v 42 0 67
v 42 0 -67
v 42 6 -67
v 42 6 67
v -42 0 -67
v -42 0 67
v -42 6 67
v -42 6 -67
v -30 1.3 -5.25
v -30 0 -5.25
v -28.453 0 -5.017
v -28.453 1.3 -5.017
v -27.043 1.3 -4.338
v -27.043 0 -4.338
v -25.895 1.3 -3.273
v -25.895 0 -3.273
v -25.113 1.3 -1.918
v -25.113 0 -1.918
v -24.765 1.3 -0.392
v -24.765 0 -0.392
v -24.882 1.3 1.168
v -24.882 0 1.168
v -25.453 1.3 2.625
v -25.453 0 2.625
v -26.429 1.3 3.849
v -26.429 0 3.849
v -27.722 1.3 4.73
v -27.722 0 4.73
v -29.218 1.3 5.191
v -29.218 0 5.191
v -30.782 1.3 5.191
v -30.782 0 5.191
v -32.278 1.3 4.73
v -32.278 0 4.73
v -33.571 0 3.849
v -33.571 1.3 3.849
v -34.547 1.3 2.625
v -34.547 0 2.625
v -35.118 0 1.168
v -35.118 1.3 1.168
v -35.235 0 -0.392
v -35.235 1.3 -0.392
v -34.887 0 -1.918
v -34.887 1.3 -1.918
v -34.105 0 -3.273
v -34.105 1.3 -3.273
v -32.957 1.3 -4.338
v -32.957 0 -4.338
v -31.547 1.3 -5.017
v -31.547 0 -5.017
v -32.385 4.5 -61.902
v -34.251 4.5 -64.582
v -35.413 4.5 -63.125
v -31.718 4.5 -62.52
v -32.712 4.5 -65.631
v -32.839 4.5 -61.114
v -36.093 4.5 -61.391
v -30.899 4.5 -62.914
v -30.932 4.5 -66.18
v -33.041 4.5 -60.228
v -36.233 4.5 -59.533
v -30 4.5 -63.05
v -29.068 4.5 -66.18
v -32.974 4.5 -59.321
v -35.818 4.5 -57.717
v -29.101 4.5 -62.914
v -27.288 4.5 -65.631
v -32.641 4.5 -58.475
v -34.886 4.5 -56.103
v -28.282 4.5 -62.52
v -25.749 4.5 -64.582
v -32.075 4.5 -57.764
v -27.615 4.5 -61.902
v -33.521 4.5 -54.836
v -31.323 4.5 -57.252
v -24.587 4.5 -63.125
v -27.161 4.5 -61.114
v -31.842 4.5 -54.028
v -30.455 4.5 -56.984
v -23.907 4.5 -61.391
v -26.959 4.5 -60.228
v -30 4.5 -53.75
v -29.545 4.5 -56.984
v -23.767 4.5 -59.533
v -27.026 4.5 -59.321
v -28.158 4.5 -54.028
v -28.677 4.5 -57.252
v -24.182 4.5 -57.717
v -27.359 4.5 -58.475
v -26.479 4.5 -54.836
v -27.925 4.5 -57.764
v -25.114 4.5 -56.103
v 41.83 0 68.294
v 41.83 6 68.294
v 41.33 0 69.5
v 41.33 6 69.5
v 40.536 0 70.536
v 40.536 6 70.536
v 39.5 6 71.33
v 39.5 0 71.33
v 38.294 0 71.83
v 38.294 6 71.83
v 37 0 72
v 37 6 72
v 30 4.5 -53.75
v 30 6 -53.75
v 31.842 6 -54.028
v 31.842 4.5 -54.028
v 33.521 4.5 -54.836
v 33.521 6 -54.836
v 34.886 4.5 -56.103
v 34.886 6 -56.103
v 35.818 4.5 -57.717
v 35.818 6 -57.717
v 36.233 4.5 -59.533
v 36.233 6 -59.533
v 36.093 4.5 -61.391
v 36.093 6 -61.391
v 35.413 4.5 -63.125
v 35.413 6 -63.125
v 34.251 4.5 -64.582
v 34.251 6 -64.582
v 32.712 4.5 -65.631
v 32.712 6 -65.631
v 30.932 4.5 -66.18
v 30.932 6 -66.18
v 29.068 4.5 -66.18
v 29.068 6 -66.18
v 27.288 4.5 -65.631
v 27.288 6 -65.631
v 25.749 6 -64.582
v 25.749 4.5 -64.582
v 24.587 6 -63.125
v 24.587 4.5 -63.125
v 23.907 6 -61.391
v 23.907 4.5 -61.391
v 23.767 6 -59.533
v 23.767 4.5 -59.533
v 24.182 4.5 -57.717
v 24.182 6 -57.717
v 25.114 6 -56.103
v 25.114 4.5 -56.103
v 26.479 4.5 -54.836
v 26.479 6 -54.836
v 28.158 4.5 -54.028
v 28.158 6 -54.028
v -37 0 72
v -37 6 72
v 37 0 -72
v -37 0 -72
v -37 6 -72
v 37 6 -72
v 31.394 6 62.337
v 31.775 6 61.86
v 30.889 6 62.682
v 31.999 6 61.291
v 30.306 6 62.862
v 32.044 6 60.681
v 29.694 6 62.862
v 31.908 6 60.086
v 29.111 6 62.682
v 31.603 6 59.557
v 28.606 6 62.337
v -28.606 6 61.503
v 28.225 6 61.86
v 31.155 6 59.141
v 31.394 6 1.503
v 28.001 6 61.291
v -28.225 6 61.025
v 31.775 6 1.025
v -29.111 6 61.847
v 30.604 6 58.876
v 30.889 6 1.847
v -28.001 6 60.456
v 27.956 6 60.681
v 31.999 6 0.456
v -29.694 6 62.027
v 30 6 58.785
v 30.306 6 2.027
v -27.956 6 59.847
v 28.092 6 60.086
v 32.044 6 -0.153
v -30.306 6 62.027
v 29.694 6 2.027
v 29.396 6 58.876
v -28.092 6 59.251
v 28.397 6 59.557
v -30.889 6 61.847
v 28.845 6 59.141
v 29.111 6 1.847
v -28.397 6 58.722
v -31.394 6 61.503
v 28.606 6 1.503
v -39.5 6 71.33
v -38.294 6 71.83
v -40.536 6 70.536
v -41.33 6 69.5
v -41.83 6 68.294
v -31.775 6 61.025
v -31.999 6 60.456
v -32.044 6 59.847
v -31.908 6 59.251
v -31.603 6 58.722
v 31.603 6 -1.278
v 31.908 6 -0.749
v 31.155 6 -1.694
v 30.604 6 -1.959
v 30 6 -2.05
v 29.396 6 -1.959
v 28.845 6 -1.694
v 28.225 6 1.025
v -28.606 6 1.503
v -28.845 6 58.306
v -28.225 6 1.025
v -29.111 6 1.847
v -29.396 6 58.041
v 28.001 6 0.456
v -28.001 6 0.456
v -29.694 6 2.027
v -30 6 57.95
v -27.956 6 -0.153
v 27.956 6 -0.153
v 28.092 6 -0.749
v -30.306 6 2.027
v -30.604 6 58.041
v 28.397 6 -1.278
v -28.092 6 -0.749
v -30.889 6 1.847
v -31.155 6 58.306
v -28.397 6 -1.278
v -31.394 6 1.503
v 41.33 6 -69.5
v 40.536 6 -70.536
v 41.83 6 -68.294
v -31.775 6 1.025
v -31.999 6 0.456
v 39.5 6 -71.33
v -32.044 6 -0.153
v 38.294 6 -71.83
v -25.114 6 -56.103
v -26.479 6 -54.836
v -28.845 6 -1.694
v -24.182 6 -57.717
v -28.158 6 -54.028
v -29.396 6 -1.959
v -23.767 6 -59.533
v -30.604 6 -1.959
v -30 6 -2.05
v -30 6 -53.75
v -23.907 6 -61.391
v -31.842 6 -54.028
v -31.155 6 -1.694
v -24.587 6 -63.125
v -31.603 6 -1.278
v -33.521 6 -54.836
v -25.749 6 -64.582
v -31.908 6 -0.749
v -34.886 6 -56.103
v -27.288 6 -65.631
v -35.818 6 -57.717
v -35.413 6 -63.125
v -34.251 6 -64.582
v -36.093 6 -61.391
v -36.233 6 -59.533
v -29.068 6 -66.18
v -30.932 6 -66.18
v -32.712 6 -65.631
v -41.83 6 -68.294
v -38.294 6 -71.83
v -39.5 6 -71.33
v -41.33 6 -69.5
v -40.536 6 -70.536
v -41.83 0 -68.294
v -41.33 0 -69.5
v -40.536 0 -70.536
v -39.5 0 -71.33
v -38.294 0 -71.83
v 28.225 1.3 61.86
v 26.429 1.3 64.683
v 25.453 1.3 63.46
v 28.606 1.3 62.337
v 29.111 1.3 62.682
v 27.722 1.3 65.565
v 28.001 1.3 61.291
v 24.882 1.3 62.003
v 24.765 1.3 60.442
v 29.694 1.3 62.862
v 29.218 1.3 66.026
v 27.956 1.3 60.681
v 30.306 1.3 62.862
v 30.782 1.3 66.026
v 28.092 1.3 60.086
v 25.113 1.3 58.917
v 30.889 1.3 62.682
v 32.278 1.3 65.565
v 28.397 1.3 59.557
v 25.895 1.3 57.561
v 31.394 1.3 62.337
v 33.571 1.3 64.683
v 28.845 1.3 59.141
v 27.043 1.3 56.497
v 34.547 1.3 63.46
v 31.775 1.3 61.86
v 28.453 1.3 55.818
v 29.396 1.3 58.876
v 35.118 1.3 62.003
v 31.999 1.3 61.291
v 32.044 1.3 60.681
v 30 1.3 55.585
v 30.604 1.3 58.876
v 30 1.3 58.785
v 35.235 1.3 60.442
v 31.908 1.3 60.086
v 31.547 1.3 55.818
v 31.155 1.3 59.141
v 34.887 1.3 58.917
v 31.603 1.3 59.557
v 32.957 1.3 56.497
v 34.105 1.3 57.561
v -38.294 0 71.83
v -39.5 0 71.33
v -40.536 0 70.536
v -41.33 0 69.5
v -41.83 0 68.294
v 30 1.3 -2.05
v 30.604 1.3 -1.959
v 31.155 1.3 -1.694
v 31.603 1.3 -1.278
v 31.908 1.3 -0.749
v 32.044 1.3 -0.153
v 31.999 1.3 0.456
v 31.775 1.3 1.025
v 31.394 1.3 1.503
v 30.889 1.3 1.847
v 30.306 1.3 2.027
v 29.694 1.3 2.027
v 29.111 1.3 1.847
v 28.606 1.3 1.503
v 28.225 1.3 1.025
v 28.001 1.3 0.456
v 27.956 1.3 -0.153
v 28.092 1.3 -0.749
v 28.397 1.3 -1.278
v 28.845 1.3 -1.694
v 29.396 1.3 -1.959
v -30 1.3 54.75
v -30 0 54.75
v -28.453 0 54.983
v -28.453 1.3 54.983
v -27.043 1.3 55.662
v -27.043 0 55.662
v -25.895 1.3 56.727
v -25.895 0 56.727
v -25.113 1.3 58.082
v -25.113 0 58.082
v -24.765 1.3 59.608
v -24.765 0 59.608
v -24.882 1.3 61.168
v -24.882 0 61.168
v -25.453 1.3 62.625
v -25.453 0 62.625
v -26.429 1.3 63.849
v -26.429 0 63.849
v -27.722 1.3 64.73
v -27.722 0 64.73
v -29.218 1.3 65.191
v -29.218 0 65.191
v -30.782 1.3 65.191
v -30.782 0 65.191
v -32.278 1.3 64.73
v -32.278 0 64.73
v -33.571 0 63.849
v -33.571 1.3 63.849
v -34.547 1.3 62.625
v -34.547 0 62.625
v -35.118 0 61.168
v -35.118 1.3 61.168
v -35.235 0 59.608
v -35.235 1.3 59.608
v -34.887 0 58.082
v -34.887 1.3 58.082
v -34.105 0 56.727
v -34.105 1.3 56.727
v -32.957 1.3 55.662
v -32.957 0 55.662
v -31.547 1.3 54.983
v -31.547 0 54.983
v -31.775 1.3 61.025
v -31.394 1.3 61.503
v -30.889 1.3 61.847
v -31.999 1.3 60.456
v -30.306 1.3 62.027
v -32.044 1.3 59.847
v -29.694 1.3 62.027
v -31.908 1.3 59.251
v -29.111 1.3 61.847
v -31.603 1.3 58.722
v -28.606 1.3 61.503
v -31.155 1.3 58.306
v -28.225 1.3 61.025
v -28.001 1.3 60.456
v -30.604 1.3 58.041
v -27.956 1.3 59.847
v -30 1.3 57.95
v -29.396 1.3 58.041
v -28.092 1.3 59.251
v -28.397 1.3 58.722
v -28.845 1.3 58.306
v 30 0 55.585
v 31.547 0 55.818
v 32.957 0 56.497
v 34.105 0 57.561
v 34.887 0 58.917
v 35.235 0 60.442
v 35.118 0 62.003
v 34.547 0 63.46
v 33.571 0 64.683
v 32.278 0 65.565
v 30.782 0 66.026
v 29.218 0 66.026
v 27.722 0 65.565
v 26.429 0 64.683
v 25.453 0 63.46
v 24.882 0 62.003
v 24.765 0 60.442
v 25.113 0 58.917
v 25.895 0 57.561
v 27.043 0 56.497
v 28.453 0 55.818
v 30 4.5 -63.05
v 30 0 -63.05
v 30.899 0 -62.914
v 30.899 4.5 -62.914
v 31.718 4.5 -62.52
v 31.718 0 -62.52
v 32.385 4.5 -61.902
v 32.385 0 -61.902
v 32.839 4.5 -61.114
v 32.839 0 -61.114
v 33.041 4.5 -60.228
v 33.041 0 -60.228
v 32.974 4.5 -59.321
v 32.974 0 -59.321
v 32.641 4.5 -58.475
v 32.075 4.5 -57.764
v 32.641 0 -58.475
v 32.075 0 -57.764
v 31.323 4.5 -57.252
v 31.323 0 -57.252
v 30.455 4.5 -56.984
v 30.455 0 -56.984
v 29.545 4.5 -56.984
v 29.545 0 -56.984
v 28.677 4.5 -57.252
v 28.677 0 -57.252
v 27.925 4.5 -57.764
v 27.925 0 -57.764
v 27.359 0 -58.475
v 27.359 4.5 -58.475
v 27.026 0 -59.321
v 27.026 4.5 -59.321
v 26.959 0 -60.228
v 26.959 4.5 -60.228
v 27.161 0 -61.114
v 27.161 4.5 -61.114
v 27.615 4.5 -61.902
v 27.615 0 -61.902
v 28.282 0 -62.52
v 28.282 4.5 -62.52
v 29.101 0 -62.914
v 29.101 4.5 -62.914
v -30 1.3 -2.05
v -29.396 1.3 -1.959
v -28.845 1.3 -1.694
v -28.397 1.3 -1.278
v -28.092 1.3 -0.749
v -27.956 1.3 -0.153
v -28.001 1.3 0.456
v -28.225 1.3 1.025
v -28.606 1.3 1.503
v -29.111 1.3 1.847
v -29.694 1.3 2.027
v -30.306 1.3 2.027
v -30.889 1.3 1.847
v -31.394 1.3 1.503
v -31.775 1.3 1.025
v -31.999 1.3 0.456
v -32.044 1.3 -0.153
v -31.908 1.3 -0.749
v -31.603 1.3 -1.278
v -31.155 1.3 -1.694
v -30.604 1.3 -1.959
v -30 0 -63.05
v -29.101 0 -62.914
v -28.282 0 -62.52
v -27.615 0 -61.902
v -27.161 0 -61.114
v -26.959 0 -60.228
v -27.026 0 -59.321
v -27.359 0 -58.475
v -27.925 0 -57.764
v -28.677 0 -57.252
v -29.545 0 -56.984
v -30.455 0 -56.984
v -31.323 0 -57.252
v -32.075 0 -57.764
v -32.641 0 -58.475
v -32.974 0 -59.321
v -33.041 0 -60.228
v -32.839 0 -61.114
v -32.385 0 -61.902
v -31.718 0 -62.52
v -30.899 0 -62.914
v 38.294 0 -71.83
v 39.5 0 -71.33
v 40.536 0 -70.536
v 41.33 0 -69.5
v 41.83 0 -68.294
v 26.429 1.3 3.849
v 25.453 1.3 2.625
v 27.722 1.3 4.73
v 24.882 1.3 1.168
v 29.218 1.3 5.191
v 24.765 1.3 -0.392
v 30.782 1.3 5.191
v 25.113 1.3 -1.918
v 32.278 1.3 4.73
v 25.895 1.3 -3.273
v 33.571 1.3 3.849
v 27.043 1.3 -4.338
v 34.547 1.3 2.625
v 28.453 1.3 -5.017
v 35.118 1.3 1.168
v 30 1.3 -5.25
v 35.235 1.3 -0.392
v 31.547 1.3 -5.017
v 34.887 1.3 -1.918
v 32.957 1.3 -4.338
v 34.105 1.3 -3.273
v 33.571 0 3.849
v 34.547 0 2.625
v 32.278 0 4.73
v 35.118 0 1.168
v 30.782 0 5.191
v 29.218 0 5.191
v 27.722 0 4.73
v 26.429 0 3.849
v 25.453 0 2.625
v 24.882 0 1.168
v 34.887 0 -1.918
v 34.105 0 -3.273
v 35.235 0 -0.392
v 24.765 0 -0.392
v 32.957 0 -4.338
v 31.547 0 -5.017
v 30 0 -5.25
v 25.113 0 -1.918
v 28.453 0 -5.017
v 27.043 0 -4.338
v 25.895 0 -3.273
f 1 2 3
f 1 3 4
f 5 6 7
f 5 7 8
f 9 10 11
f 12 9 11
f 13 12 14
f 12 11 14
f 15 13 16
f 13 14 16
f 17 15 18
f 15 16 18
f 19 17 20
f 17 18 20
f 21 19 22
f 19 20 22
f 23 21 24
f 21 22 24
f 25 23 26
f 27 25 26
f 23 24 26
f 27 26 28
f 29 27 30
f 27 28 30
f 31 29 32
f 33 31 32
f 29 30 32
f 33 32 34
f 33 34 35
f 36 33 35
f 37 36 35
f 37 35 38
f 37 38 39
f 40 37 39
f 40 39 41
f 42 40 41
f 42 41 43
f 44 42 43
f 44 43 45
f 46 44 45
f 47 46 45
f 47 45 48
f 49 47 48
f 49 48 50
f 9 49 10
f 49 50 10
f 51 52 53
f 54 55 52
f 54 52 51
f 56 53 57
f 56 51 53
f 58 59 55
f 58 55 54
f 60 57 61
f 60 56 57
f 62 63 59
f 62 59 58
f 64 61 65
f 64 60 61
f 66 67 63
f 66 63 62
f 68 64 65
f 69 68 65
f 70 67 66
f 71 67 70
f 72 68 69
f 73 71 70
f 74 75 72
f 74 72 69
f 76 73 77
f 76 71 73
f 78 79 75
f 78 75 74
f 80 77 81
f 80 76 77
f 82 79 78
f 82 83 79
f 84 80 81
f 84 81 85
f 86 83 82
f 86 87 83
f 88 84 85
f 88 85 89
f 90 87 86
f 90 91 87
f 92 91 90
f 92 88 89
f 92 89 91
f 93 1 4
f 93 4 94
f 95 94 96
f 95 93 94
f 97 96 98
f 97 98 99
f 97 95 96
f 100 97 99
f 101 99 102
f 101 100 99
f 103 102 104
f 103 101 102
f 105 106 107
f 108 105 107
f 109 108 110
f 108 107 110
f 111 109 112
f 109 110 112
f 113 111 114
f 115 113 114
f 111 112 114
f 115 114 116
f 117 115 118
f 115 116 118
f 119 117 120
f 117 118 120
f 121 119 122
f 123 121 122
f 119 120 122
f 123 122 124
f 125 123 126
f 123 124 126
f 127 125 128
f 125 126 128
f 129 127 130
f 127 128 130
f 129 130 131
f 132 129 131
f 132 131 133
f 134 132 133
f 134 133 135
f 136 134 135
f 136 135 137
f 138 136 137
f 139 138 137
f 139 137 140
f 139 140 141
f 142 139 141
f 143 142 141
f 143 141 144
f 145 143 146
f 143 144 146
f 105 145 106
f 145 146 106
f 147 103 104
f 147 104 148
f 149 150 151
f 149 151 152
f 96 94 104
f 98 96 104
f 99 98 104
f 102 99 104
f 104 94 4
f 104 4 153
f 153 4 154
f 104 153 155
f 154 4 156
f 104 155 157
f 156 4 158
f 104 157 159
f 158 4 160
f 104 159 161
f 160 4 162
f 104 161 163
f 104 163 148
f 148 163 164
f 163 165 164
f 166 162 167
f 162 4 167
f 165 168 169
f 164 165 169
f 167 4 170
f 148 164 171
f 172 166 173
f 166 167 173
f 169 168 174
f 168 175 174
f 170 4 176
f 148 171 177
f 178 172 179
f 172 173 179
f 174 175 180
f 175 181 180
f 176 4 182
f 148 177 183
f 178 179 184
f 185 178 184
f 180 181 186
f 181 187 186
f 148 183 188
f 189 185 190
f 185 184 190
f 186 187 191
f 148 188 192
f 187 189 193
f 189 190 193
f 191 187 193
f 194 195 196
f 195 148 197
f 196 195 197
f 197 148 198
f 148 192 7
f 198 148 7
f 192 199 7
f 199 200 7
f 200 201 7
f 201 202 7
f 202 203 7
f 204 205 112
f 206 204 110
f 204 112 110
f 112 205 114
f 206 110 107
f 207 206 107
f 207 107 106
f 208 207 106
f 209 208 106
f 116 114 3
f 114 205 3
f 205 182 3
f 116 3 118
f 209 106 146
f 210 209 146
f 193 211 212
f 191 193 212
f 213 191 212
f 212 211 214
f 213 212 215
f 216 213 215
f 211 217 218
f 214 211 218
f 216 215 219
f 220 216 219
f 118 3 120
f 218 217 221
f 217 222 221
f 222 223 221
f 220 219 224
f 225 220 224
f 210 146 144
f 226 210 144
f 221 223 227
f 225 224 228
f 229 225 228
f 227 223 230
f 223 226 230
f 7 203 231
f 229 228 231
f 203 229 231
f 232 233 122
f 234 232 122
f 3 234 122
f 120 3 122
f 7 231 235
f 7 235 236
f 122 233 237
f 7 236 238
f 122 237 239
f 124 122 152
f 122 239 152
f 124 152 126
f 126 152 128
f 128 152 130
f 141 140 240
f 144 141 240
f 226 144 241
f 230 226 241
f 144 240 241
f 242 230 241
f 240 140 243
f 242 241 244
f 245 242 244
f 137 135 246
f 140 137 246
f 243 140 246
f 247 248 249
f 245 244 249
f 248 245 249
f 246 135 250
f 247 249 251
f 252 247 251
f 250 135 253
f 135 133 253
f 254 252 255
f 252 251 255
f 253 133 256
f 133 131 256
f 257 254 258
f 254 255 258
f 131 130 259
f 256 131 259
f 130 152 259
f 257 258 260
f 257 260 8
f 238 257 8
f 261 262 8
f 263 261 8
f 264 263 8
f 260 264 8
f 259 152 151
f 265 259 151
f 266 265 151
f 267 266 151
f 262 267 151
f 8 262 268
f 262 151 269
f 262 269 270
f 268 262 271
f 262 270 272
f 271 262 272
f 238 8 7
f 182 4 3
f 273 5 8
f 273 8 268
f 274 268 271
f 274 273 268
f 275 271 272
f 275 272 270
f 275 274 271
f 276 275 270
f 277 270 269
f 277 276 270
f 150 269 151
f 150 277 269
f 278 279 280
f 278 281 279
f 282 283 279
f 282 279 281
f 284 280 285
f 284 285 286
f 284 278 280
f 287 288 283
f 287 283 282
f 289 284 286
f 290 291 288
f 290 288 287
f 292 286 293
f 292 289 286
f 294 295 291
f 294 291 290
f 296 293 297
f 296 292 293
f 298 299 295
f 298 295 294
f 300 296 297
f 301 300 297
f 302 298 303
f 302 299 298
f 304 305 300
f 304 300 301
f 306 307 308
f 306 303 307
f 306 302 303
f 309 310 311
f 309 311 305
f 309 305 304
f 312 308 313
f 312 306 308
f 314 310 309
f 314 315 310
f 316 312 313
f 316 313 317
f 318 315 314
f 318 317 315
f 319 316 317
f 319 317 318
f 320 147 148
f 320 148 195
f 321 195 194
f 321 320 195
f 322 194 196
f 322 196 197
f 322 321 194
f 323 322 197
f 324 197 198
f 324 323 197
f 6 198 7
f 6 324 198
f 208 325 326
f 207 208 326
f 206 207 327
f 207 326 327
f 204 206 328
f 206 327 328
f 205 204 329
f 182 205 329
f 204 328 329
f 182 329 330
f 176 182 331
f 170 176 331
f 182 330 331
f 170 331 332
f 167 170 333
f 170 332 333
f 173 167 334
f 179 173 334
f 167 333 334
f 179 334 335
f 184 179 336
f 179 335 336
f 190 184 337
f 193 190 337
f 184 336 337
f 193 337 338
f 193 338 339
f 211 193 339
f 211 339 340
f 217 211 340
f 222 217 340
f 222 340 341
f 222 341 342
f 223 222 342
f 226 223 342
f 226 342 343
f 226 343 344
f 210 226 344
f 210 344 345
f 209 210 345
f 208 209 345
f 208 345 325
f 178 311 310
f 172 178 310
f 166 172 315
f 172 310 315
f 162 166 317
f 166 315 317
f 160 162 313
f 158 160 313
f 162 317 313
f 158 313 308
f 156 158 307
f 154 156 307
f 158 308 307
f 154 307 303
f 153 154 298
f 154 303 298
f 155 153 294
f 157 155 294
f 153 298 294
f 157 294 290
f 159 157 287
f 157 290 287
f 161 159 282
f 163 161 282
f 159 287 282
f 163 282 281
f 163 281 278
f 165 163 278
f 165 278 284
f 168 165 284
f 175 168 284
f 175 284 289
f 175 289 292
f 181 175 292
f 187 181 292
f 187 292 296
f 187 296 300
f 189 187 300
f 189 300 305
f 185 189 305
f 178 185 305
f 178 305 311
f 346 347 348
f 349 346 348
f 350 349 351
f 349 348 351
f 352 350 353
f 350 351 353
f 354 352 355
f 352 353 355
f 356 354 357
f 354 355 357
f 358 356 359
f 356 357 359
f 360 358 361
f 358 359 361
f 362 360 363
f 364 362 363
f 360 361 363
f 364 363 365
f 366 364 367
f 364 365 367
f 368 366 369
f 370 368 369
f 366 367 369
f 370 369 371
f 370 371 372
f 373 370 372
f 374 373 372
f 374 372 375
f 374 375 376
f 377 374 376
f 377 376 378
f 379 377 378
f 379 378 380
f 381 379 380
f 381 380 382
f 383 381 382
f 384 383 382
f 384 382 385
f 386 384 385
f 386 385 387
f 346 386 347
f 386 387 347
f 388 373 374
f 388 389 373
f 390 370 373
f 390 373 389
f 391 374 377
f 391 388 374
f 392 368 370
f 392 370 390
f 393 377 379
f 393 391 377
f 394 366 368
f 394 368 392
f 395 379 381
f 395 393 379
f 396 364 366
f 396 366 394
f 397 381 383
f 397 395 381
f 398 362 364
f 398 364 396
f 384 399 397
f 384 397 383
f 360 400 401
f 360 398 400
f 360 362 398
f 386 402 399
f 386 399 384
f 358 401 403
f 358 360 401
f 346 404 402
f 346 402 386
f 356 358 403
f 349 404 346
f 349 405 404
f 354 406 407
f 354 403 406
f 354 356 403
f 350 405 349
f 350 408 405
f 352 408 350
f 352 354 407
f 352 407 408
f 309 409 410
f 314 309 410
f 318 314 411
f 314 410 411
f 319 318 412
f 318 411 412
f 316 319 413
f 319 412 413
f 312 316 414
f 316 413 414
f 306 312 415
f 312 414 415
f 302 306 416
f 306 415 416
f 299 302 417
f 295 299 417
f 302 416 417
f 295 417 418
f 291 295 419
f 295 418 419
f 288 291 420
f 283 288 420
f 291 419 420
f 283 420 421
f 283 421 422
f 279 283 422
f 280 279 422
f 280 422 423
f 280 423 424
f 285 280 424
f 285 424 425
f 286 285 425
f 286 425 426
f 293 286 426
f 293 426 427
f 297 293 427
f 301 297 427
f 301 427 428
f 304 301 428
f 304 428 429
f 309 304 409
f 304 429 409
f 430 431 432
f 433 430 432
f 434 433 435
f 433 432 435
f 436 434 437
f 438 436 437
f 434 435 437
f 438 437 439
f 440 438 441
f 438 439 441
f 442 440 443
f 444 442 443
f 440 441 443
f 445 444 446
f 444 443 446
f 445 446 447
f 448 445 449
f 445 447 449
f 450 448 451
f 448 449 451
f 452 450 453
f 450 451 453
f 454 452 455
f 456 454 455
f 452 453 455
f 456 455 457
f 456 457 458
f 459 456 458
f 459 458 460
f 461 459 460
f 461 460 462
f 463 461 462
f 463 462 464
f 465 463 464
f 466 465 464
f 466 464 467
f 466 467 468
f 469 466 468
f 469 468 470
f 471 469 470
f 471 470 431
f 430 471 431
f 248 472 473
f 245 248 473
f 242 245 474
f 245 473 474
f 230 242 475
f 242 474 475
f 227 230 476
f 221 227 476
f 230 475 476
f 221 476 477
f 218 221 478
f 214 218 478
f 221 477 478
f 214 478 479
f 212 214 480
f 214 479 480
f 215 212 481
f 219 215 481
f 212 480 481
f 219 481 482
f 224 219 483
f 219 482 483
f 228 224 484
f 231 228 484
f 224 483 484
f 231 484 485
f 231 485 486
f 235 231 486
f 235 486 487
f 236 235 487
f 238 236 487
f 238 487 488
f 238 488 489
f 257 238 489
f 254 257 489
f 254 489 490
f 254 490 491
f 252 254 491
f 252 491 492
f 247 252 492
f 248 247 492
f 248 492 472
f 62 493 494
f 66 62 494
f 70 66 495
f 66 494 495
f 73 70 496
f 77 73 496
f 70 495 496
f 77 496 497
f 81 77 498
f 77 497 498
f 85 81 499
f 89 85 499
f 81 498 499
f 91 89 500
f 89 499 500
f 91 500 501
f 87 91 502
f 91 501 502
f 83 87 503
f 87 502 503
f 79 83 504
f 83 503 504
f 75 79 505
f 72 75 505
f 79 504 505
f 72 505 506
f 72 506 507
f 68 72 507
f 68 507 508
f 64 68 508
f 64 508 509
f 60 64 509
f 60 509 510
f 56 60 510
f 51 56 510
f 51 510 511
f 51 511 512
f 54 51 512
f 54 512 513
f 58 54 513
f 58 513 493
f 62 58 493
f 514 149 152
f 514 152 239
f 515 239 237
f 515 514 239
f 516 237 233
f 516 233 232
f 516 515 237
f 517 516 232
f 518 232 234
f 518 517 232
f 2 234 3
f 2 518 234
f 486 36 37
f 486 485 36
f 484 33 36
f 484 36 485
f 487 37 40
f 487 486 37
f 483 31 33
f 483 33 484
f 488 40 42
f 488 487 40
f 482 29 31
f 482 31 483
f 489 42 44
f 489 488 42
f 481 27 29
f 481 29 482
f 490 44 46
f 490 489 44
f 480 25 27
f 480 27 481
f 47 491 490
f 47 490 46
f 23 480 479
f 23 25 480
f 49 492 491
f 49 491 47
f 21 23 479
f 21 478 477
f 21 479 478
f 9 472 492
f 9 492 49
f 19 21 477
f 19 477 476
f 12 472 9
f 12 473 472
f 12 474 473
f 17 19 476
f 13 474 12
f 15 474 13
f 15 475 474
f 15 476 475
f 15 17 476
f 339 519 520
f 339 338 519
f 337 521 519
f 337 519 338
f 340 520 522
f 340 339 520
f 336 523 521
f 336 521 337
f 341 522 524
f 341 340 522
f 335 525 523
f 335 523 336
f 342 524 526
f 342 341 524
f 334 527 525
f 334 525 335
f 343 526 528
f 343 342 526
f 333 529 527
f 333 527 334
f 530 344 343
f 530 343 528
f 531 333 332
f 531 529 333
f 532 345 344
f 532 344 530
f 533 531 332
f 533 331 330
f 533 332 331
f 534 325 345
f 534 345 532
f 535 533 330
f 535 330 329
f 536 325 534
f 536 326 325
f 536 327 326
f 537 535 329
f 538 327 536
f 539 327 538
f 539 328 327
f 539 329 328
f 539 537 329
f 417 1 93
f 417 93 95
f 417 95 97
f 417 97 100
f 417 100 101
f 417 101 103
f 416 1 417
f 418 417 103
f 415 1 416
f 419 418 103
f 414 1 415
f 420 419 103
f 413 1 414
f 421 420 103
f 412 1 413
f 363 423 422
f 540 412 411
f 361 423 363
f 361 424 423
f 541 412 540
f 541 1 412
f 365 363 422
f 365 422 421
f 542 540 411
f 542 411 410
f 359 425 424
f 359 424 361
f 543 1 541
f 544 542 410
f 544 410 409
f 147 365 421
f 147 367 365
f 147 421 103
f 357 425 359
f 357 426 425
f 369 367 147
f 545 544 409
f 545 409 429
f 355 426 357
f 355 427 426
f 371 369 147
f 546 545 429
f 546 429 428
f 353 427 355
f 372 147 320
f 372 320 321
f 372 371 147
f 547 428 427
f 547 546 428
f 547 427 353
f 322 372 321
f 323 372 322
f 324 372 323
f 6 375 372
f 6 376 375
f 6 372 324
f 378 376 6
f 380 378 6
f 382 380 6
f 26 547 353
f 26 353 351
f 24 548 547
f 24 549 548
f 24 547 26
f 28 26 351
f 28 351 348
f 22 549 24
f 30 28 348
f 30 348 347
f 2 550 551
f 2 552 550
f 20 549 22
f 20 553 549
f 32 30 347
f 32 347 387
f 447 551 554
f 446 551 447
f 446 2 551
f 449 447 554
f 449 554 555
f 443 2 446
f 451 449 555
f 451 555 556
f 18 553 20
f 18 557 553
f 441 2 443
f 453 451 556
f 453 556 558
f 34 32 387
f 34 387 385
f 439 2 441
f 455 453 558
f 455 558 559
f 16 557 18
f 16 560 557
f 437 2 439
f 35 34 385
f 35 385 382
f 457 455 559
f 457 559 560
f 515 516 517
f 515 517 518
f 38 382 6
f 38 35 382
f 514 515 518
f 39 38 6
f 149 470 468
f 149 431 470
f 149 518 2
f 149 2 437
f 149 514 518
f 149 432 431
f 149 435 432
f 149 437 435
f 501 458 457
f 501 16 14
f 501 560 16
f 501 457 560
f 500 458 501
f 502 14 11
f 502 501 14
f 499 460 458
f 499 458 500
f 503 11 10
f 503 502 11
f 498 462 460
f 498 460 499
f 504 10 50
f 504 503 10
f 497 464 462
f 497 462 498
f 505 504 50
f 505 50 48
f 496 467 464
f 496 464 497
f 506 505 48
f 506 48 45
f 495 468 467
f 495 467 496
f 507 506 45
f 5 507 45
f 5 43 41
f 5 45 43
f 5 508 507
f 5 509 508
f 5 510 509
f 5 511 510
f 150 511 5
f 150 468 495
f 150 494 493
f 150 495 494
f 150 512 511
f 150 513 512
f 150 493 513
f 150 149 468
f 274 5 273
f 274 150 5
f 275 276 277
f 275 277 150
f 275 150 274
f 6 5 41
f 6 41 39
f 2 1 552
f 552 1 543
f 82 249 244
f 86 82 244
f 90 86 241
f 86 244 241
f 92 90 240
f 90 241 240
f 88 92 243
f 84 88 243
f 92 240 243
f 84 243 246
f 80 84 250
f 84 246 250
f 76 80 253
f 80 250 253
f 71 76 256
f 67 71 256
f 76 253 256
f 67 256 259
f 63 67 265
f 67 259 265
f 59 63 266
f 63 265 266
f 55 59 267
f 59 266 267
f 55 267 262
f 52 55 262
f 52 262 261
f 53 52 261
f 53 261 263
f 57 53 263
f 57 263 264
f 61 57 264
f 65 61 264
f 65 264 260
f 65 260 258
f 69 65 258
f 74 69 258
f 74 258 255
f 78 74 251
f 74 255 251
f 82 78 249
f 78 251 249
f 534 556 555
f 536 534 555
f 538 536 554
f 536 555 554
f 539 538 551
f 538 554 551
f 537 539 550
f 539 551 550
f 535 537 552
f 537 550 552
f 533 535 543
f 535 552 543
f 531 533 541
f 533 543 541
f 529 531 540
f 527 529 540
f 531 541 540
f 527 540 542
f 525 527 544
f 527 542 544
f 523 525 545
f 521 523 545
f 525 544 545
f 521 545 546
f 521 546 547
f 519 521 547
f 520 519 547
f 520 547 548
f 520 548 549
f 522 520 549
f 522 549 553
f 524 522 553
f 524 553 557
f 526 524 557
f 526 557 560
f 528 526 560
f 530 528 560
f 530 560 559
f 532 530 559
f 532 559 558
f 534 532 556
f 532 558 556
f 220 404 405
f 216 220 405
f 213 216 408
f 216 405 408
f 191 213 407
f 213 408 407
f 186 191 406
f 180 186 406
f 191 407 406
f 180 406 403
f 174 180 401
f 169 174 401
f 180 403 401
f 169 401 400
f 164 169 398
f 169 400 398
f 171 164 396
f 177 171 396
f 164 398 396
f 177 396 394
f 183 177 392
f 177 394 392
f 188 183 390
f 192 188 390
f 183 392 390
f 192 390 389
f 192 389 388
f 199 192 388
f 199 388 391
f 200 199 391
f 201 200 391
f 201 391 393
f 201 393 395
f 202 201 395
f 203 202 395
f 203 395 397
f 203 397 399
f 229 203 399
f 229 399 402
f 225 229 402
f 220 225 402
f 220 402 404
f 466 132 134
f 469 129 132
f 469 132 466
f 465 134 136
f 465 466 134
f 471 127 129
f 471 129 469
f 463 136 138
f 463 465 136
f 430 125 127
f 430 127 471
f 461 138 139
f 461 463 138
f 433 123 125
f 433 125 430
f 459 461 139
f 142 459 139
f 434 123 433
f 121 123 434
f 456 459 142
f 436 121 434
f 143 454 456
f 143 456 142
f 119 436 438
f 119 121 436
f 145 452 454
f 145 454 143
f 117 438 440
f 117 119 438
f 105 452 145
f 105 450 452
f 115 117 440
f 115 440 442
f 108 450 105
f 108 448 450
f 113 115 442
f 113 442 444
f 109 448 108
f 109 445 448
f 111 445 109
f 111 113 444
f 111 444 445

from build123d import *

# Parameters (mm, degrees)
EXTRUDE_1_DEPTH     = 6
SKETCH_2_R          = 2.05
SKETCH_2_R_2        = 3.05
CUT_EXTRUDE_1_DEPTH = 6
SKETCH_3_R          = 5.25
CUT_EXTRUDE_2_DEPTH = 1.3
SKETCH_5_R          = 6.25
CUT_EXTRUDE_3_DEPTH = 1.5


with BuildPart() as part:
    # 草图1 → 凸台-拉伸1 (new body)
    with BuildSketch(Plane(origin=(0, 0, 0), x_dir=(1, 0, 0), z_dir=(0, 1, 0))):
        with BuildLine():
            Line((37, -72), (-37, -72))
            ThreePointArc((-37, -72), (-40.535533906, -70.535533906), (-42, -67))
            Line((-42, -67), (-42, 67))
            ThreePointArc((-42, 67), (-40.535533906, 70.535533906), (-37, 72))
            Line((-37, 72), (37, 72))
            ThreePointArc((37, 72), (40.535533906, 70.535533906), (42, 67))
            Line((42, 67), (42, -67))
            ThreePointArc((42, -67), (40.535533906, -70.535533906), (37, -72))
        make_face()
    extrude(amount=EXTRUDE_1_DEPTH)

    # 草图2 → 切除-拉伸1 (cut)
    with BuildSketch(Plane.XZ):
        with Locations(Location((-30, 60, 0), (0, 0, 270))):
            Circle(SKETCH_2_R)
        with Locations(Location((30, 60.83466259, 0), (0, 0, 270))):
            Circle(SKETCH_2_R)
        with Locations(Location((-30, 0, 0), (0, 0, 270))):
            Circle(SKETCH_2_R)
        with Locations(Location((30, 0, 0), (0, 0, 270))):
            Circle(SKETCH_2_R)
        with Locations(Location((-30, -60, 0), (0, 0, 270))):
            Circle(SKETCH_2_R_2)
        with Locations(Location((30, -60, 0), (0, 0, 270))):
            Circle(SKETCH_2_R_2)
    extrude(amount=-CUT_EXTRUDE_1_DEPTH, mode=Mode.SUBTRACT)

    # 草图3 → 切除-拉伸2 (cut)
    with BuildSketch(Plane.XZ):
        with Locations(Location((-30, 60, 0), (0, 0, 270))):
            Circle(SKETCH_3_R)
        with Locations(Location((30, 60.83466259, 0), (0, 0, 270))):
            Circle(SKETCH_3_R)
        with Locations(Location((-30, 0, 0), (0, 0, 270))):
            Circle(SKETCH_3_R)
        with Locations(Location((30, 0, 0), (0, 0, 270))):
            Circle(SKETCH_3_R)
    extrude(amount=-CUT_EXTRUDE_2_DEPTH, mode=Mode.SUBTRACT)

    # 草图5 → 切除-拉伸3 (cut)
    with BuildSketch(Plane(origin=(0, 6, 0), x_dir=(1, 0, 0), z_dir=(0, 1, 0))):
        with Locations(Location((-30, 60, 0), (0, 0, 270))):
            Circle(SKETCH_5_R)
        with Locations(Location((30, 60, 0), (0, 0, 270))):
            Circle(SKETCH_5_R)
    extrude(amount=-CUT_EXTRUDE_3_DEPTH, mode=Mode.SUBTRACT)


solid = part.part
